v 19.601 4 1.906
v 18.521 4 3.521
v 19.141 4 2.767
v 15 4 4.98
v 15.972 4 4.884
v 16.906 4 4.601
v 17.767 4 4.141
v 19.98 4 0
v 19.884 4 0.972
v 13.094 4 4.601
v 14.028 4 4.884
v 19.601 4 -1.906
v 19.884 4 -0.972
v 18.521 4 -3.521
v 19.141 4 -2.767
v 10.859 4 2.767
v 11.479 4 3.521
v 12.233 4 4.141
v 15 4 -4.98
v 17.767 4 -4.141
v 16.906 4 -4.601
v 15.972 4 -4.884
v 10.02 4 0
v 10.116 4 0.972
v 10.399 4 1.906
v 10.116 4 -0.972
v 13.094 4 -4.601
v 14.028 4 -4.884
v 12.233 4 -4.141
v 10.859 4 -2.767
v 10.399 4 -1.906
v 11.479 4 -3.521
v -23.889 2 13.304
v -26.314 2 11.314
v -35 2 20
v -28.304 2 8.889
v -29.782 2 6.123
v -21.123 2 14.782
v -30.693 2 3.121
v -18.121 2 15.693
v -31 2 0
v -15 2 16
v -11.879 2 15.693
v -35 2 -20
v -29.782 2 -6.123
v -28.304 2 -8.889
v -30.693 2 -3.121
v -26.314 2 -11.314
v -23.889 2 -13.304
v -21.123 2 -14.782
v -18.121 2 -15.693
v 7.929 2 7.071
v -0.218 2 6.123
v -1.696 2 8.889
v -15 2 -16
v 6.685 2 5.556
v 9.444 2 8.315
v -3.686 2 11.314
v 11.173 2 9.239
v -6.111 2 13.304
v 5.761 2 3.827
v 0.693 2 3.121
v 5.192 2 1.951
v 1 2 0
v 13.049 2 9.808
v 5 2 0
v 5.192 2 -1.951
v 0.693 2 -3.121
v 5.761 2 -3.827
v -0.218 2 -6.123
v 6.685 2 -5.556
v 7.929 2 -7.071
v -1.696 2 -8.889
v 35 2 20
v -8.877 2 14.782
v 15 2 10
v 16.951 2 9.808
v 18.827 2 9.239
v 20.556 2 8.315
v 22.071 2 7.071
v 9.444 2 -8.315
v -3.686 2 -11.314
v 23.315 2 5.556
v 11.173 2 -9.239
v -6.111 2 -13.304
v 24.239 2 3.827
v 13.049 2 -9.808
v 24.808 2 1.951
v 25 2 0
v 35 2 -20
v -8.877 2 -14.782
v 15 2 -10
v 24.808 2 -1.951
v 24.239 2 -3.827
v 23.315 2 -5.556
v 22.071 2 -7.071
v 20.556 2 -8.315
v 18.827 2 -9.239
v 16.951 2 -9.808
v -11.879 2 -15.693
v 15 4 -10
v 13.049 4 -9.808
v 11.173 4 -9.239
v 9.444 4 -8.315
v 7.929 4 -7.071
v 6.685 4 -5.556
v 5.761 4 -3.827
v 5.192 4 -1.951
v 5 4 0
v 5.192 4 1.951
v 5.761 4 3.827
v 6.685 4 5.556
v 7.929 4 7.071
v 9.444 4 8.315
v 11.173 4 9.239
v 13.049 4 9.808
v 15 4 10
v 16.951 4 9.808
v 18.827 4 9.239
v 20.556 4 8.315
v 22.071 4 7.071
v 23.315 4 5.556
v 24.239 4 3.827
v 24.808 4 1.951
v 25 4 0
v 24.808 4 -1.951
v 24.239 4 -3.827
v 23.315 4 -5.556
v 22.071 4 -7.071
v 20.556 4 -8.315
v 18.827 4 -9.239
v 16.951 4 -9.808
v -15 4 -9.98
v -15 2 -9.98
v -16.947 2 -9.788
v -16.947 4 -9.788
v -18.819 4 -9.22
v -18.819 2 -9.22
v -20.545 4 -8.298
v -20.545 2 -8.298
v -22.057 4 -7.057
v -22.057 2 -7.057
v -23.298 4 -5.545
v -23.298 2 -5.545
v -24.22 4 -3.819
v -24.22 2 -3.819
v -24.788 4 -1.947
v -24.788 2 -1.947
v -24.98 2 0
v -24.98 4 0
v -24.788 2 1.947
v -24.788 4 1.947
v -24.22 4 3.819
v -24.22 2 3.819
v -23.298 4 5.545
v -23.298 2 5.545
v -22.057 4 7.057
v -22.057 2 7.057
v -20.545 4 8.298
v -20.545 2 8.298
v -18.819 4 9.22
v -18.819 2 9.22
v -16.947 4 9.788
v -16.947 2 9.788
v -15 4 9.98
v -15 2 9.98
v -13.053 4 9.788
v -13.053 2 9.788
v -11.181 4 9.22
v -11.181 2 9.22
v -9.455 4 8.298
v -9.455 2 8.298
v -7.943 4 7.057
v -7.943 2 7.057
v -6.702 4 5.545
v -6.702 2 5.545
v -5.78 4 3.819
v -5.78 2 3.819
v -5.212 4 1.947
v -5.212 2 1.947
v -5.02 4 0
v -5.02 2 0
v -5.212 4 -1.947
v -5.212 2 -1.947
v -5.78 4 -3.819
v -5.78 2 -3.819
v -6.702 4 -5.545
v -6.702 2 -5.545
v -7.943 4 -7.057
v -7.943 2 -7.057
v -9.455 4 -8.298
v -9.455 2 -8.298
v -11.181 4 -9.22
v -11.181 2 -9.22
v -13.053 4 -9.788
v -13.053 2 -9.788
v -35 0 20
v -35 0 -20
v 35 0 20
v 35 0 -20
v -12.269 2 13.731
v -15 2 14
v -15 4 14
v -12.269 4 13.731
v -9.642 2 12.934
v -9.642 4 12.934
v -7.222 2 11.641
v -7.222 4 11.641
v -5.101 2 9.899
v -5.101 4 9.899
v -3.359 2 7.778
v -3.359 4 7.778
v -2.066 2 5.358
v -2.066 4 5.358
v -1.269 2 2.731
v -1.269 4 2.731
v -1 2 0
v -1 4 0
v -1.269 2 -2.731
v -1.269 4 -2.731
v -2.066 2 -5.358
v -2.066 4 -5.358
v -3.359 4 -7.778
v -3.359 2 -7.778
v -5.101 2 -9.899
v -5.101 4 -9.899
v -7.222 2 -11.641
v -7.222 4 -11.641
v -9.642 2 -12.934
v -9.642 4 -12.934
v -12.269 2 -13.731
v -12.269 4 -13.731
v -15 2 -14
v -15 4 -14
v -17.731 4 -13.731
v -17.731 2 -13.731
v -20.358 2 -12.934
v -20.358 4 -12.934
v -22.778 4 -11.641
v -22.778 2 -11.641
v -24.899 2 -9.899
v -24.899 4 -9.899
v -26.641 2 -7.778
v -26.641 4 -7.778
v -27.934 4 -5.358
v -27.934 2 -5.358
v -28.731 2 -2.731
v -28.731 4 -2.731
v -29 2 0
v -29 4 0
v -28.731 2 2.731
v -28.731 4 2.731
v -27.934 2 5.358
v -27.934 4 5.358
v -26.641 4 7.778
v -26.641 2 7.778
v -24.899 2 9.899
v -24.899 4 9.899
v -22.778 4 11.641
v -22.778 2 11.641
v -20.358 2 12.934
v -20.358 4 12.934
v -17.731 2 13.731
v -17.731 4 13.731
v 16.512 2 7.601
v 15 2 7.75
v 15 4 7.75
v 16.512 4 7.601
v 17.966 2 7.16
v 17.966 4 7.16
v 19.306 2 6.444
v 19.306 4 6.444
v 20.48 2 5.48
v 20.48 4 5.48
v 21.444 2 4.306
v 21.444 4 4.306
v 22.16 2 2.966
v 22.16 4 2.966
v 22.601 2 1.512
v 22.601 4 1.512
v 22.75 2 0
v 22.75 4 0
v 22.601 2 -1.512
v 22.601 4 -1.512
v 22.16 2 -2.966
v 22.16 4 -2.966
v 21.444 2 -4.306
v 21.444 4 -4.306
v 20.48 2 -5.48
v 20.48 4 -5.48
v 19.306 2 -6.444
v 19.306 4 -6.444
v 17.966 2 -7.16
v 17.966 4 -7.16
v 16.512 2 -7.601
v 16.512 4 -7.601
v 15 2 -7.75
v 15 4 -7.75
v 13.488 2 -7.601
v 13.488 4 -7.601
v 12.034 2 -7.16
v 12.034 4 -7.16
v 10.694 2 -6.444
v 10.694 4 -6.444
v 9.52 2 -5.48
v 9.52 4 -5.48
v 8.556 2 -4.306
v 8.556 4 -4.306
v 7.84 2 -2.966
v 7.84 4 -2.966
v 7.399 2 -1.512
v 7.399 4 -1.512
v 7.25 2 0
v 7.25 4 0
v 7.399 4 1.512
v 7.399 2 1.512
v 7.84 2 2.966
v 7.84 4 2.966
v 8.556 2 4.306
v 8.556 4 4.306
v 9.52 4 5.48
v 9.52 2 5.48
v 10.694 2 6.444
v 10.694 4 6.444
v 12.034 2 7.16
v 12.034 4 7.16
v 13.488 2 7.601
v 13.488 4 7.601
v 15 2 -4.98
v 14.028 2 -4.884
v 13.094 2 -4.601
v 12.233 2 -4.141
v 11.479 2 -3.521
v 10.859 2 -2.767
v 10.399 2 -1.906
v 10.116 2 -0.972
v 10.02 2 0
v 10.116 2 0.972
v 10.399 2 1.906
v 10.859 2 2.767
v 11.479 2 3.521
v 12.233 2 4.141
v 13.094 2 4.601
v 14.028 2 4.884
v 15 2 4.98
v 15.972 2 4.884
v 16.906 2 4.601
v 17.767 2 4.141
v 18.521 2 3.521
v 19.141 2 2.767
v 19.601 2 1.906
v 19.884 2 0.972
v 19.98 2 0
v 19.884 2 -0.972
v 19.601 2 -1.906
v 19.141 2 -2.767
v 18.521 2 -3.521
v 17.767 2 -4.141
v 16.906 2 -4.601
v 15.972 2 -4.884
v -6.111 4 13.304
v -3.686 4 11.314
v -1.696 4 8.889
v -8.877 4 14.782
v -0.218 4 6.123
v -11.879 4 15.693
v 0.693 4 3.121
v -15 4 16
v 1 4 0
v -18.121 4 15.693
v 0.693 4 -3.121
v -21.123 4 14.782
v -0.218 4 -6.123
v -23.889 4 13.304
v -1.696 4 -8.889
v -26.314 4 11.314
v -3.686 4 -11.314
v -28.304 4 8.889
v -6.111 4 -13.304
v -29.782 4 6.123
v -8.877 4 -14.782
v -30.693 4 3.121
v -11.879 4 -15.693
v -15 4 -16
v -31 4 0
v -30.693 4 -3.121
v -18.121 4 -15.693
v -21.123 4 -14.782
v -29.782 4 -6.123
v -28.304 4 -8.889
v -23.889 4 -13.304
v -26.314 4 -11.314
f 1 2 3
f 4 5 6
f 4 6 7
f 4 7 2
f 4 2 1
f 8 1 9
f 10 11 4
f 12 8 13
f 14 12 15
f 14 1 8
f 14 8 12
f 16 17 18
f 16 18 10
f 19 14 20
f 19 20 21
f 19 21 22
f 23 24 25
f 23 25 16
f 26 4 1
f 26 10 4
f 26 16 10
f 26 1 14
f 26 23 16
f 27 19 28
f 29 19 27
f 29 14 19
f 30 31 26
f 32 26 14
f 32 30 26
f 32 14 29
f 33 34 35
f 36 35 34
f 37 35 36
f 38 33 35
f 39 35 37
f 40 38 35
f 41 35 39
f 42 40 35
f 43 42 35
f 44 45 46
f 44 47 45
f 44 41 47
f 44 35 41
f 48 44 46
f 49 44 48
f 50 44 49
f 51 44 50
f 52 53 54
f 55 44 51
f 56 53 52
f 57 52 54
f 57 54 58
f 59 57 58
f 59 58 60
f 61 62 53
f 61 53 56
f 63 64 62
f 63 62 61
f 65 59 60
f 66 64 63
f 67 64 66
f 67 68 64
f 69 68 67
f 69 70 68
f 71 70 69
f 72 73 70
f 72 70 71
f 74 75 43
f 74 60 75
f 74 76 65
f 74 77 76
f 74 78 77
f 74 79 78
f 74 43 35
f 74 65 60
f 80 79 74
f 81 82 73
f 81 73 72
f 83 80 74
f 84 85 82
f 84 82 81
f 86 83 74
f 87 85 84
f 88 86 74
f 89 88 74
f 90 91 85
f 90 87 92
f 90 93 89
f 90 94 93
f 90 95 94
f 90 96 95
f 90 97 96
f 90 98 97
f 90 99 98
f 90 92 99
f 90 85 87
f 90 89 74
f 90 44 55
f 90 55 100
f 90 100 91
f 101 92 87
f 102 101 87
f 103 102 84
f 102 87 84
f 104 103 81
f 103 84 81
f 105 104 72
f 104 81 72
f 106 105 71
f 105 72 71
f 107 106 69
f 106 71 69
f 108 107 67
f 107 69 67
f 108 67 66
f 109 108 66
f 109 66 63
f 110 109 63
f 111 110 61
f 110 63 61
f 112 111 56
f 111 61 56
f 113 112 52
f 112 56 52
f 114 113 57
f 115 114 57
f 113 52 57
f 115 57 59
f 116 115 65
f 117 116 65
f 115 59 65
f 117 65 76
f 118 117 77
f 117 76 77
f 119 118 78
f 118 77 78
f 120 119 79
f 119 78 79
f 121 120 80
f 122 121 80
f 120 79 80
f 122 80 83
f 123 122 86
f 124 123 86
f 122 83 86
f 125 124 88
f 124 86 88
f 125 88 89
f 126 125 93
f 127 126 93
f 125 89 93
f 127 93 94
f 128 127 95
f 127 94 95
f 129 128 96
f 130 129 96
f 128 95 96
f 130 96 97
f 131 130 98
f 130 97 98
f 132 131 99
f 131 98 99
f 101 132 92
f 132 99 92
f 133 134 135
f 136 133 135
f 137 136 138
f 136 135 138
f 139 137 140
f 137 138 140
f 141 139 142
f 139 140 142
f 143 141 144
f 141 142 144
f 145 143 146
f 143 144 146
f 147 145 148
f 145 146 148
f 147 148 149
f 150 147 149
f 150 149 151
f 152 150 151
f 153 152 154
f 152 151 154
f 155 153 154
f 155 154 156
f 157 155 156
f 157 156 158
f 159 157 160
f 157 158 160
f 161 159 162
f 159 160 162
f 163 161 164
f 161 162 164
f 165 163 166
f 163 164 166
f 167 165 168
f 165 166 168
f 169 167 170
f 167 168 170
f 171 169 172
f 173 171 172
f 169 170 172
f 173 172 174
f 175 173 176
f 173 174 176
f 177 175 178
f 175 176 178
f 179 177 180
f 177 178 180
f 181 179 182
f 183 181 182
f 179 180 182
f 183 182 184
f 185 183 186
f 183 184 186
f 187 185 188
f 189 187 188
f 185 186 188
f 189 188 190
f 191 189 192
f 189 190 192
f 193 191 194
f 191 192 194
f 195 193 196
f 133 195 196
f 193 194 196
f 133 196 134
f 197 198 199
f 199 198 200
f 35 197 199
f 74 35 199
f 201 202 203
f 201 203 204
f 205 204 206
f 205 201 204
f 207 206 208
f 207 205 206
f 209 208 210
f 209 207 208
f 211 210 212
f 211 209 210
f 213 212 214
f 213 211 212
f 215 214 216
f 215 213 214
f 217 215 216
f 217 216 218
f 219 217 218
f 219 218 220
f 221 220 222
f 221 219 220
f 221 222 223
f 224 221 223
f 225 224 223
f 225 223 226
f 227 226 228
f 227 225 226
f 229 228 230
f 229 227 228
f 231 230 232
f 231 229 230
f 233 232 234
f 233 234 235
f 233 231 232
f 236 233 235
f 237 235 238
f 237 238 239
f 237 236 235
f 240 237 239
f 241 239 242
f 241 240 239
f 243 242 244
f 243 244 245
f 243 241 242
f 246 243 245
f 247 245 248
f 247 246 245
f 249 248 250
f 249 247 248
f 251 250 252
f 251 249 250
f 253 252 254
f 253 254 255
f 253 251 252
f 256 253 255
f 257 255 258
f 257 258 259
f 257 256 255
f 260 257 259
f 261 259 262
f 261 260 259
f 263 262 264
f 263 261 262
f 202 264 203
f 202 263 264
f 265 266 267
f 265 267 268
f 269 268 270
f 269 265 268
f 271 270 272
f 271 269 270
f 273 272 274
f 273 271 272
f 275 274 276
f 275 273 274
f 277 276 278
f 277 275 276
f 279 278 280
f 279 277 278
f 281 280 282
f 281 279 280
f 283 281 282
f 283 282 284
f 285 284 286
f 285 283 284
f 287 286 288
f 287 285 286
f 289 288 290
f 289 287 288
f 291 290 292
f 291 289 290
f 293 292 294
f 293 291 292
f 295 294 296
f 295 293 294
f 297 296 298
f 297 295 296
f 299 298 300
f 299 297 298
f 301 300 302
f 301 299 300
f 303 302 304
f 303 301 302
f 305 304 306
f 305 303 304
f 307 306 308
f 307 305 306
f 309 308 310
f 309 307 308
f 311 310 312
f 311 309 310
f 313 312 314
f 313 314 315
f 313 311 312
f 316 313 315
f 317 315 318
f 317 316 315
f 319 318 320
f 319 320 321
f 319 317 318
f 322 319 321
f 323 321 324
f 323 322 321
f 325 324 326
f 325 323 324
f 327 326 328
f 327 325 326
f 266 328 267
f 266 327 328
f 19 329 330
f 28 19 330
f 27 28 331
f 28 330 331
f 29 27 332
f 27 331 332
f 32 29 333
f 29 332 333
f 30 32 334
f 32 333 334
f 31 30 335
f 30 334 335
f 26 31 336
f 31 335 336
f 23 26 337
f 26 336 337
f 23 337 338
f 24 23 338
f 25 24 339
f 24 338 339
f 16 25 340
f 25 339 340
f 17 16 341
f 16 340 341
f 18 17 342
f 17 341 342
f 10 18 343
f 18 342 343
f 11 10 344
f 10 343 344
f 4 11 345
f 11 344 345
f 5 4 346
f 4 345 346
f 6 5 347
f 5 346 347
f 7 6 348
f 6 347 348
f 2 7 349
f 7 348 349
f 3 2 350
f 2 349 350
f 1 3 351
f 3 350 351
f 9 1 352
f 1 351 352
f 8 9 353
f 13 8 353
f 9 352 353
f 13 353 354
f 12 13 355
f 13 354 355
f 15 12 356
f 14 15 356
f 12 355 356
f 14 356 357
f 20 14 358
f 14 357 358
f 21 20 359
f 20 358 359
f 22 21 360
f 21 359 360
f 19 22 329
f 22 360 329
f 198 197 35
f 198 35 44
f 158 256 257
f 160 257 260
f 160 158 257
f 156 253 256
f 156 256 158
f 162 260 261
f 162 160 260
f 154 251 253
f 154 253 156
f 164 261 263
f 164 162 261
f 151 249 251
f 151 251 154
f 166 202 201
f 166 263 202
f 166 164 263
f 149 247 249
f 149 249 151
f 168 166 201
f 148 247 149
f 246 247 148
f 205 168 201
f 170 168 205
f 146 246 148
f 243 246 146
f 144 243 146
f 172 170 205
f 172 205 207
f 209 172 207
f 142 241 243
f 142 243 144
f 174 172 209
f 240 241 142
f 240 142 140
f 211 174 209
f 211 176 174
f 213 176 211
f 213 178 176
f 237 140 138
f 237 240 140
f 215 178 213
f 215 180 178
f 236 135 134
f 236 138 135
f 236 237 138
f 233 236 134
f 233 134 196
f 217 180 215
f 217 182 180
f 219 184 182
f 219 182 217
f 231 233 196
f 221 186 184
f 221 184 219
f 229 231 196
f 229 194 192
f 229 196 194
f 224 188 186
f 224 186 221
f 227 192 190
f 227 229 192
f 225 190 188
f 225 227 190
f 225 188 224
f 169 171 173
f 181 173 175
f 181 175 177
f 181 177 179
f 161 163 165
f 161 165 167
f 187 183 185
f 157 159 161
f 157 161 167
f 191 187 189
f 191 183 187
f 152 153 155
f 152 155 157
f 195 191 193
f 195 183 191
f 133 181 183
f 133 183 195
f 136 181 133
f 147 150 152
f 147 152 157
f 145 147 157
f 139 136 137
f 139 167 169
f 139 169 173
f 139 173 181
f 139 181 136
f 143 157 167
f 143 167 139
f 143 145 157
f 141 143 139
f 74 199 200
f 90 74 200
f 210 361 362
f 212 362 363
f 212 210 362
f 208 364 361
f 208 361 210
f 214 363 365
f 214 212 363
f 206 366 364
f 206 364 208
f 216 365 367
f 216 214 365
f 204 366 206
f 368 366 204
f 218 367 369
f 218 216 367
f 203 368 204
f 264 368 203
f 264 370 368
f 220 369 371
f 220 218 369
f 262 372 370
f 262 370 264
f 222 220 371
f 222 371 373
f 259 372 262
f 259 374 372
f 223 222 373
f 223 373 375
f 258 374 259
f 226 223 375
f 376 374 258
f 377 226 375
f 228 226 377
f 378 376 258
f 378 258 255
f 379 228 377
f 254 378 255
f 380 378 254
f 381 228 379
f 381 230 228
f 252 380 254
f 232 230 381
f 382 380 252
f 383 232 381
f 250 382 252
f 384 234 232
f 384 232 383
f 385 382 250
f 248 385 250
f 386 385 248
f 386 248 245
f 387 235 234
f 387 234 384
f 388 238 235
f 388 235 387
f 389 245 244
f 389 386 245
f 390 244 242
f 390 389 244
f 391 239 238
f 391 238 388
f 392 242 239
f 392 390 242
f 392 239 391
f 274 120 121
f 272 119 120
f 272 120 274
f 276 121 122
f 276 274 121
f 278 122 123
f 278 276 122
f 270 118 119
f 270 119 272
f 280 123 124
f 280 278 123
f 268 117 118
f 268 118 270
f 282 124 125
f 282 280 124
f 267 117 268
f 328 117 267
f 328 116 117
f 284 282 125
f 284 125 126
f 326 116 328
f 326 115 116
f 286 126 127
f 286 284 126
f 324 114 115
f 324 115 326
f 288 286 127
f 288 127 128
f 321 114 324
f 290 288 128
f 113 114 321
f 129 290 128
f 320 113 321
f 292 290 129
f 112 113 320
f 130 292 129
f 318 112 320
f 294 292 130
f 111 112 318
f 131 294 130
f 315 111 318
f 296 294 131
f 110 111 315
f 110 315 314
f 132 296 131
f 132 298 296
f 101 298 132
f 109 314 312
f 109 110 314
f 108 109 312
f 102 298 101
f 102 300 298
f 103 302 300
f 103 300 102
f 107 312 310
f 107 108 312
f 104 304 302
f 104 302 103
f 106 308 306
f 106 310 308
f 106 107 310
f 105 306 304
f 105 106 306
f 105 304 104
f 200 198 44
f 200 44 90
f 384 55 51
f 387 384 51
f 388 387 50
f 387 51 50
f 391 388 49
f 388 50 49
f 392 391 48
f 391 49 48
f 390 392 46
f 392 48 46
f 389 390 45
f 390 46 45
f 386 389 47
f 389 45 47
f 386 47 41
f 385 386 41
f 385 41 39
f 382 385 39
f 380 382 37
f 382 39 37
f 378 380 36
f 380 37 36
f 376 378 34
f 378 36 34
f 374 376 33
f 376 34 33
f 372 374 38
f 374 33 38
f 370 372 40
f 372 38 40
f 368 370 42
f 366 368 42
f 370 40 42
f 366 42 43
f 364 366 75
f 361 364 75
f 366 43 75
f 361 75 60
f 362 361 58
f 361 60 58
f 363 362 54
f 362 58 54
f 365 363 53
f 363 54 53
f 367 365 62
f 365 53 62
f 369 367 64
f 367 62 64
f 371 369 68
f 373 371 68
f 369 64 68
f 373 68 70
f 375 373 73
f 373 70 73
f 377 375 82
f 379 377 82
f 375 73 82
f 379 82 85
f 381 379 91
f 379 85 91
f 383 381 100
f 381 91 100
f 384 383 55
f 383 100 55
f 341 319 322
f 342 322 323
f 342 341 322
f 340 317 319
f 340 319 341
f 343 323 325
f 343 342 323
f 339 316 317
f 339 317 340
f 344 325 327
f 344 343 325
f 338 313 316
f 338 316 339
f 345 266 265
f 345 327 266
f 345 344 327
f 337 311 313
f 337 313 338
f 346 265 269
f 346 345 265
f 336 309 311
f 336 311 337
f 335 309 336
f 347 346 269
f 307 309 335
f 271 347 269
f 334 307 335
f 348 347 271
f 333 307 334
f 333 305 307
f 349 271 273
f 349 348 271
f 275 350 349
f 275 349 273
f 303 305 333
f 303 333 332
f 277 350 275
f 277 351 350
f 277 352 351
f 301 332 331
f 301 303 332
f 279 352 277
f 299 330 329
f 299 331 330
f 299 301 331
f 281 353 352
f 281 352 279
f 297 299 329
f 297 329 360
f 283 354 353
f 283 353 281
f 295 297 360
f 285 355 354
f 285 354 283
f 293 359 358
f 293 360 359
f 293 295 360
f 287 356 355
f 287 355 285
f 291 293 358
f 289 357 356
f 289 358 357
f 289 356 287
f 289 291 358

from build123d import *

# Parameters (mm, degrees)
CROQUIS1_W              = 70
CROQUIS1_H              = 40
SALIENTE_EXTRUIR1_DEPTH = 2
CROQUIS2_R              = 16
CROQUIS2_R_2            = 14
CROQUIS2_R_3            = 9.98
CROQUIS2_R_4            = 10
CROQUIS2_R_5            = 7.75
CROQUIS2_R_6            = 4.98
SALIENTE_EXTRUIR2_DEPTH = 2


with BuildPart() as part:
    # Croquis1 → Saliente-Extruir1 (new body)
    with BuildSketch(Plane(origin=(0, 0, 0), x_dir=(1, 0, 0), z_dir=(0, 1, 0))):
        Rectangle(CROQUIS1_W, CROQUIS1_H)
    extrude(amount=SALIENTE_EXTRUIR1_DEPTH)

    # Croquis2 → Saliente-Extruir2 (add)
    # profile 1 of 4: a face of its own
    with BuildSketch(Plane(origin=(0, 2, 0), x_dir=(1, 0, 0), z_dir=(0, 1, 0))):
        with Locations(Location((-15, 0, 0), (0, 0, 90))):
            Circle(CROQUIS2_R)
        with Locations(Location((-15, 0, 0), (0, 0, 270))):
            Circle(CROQUIS2_R_2, mode=Mode.SUBTRACT)
    # profile 2 of 4: a face of its own
    with BuildSketch(Plane(origin=(0, 2, 0), x_dir=(1, 0, 0), z_dir=(0, 1, 0))):
        with Locations(Location((-15, 0, 0), (0, 0, 90))):
            Circle(CROQUIS2_R_3)
    # profile 3 of 4: a face of its own
    with BuildSketch(Plane(origin=(0, 2, 0), x_dir=(1, 0, 0), z_dir=(0, 1, 0))):
        with Locations(Location((15, 0, 0), (0, 0, 90))):
            Circle(CROQUIS2_R_4)
        with Locations(Location((15, 0, 0), (0, 0, 270))):
            Circle(CROQUIS2_R_5, mode=Mode.SUBTRACT)
    # profile 4 of 4: a face of its own
    with BuildSketch(Plane(origin=(0, 2, 0), x_dir=(1, 0, 0), z_dir=(0, 1, 0))):
        with Locations(Location((15, 0, 0), (0, 0, 90))):
            Circle(CROQUIS2_R_6)
    extrude(amount=SALIENTE_EXTRUIR2_DEPTH)


solid = part.part
